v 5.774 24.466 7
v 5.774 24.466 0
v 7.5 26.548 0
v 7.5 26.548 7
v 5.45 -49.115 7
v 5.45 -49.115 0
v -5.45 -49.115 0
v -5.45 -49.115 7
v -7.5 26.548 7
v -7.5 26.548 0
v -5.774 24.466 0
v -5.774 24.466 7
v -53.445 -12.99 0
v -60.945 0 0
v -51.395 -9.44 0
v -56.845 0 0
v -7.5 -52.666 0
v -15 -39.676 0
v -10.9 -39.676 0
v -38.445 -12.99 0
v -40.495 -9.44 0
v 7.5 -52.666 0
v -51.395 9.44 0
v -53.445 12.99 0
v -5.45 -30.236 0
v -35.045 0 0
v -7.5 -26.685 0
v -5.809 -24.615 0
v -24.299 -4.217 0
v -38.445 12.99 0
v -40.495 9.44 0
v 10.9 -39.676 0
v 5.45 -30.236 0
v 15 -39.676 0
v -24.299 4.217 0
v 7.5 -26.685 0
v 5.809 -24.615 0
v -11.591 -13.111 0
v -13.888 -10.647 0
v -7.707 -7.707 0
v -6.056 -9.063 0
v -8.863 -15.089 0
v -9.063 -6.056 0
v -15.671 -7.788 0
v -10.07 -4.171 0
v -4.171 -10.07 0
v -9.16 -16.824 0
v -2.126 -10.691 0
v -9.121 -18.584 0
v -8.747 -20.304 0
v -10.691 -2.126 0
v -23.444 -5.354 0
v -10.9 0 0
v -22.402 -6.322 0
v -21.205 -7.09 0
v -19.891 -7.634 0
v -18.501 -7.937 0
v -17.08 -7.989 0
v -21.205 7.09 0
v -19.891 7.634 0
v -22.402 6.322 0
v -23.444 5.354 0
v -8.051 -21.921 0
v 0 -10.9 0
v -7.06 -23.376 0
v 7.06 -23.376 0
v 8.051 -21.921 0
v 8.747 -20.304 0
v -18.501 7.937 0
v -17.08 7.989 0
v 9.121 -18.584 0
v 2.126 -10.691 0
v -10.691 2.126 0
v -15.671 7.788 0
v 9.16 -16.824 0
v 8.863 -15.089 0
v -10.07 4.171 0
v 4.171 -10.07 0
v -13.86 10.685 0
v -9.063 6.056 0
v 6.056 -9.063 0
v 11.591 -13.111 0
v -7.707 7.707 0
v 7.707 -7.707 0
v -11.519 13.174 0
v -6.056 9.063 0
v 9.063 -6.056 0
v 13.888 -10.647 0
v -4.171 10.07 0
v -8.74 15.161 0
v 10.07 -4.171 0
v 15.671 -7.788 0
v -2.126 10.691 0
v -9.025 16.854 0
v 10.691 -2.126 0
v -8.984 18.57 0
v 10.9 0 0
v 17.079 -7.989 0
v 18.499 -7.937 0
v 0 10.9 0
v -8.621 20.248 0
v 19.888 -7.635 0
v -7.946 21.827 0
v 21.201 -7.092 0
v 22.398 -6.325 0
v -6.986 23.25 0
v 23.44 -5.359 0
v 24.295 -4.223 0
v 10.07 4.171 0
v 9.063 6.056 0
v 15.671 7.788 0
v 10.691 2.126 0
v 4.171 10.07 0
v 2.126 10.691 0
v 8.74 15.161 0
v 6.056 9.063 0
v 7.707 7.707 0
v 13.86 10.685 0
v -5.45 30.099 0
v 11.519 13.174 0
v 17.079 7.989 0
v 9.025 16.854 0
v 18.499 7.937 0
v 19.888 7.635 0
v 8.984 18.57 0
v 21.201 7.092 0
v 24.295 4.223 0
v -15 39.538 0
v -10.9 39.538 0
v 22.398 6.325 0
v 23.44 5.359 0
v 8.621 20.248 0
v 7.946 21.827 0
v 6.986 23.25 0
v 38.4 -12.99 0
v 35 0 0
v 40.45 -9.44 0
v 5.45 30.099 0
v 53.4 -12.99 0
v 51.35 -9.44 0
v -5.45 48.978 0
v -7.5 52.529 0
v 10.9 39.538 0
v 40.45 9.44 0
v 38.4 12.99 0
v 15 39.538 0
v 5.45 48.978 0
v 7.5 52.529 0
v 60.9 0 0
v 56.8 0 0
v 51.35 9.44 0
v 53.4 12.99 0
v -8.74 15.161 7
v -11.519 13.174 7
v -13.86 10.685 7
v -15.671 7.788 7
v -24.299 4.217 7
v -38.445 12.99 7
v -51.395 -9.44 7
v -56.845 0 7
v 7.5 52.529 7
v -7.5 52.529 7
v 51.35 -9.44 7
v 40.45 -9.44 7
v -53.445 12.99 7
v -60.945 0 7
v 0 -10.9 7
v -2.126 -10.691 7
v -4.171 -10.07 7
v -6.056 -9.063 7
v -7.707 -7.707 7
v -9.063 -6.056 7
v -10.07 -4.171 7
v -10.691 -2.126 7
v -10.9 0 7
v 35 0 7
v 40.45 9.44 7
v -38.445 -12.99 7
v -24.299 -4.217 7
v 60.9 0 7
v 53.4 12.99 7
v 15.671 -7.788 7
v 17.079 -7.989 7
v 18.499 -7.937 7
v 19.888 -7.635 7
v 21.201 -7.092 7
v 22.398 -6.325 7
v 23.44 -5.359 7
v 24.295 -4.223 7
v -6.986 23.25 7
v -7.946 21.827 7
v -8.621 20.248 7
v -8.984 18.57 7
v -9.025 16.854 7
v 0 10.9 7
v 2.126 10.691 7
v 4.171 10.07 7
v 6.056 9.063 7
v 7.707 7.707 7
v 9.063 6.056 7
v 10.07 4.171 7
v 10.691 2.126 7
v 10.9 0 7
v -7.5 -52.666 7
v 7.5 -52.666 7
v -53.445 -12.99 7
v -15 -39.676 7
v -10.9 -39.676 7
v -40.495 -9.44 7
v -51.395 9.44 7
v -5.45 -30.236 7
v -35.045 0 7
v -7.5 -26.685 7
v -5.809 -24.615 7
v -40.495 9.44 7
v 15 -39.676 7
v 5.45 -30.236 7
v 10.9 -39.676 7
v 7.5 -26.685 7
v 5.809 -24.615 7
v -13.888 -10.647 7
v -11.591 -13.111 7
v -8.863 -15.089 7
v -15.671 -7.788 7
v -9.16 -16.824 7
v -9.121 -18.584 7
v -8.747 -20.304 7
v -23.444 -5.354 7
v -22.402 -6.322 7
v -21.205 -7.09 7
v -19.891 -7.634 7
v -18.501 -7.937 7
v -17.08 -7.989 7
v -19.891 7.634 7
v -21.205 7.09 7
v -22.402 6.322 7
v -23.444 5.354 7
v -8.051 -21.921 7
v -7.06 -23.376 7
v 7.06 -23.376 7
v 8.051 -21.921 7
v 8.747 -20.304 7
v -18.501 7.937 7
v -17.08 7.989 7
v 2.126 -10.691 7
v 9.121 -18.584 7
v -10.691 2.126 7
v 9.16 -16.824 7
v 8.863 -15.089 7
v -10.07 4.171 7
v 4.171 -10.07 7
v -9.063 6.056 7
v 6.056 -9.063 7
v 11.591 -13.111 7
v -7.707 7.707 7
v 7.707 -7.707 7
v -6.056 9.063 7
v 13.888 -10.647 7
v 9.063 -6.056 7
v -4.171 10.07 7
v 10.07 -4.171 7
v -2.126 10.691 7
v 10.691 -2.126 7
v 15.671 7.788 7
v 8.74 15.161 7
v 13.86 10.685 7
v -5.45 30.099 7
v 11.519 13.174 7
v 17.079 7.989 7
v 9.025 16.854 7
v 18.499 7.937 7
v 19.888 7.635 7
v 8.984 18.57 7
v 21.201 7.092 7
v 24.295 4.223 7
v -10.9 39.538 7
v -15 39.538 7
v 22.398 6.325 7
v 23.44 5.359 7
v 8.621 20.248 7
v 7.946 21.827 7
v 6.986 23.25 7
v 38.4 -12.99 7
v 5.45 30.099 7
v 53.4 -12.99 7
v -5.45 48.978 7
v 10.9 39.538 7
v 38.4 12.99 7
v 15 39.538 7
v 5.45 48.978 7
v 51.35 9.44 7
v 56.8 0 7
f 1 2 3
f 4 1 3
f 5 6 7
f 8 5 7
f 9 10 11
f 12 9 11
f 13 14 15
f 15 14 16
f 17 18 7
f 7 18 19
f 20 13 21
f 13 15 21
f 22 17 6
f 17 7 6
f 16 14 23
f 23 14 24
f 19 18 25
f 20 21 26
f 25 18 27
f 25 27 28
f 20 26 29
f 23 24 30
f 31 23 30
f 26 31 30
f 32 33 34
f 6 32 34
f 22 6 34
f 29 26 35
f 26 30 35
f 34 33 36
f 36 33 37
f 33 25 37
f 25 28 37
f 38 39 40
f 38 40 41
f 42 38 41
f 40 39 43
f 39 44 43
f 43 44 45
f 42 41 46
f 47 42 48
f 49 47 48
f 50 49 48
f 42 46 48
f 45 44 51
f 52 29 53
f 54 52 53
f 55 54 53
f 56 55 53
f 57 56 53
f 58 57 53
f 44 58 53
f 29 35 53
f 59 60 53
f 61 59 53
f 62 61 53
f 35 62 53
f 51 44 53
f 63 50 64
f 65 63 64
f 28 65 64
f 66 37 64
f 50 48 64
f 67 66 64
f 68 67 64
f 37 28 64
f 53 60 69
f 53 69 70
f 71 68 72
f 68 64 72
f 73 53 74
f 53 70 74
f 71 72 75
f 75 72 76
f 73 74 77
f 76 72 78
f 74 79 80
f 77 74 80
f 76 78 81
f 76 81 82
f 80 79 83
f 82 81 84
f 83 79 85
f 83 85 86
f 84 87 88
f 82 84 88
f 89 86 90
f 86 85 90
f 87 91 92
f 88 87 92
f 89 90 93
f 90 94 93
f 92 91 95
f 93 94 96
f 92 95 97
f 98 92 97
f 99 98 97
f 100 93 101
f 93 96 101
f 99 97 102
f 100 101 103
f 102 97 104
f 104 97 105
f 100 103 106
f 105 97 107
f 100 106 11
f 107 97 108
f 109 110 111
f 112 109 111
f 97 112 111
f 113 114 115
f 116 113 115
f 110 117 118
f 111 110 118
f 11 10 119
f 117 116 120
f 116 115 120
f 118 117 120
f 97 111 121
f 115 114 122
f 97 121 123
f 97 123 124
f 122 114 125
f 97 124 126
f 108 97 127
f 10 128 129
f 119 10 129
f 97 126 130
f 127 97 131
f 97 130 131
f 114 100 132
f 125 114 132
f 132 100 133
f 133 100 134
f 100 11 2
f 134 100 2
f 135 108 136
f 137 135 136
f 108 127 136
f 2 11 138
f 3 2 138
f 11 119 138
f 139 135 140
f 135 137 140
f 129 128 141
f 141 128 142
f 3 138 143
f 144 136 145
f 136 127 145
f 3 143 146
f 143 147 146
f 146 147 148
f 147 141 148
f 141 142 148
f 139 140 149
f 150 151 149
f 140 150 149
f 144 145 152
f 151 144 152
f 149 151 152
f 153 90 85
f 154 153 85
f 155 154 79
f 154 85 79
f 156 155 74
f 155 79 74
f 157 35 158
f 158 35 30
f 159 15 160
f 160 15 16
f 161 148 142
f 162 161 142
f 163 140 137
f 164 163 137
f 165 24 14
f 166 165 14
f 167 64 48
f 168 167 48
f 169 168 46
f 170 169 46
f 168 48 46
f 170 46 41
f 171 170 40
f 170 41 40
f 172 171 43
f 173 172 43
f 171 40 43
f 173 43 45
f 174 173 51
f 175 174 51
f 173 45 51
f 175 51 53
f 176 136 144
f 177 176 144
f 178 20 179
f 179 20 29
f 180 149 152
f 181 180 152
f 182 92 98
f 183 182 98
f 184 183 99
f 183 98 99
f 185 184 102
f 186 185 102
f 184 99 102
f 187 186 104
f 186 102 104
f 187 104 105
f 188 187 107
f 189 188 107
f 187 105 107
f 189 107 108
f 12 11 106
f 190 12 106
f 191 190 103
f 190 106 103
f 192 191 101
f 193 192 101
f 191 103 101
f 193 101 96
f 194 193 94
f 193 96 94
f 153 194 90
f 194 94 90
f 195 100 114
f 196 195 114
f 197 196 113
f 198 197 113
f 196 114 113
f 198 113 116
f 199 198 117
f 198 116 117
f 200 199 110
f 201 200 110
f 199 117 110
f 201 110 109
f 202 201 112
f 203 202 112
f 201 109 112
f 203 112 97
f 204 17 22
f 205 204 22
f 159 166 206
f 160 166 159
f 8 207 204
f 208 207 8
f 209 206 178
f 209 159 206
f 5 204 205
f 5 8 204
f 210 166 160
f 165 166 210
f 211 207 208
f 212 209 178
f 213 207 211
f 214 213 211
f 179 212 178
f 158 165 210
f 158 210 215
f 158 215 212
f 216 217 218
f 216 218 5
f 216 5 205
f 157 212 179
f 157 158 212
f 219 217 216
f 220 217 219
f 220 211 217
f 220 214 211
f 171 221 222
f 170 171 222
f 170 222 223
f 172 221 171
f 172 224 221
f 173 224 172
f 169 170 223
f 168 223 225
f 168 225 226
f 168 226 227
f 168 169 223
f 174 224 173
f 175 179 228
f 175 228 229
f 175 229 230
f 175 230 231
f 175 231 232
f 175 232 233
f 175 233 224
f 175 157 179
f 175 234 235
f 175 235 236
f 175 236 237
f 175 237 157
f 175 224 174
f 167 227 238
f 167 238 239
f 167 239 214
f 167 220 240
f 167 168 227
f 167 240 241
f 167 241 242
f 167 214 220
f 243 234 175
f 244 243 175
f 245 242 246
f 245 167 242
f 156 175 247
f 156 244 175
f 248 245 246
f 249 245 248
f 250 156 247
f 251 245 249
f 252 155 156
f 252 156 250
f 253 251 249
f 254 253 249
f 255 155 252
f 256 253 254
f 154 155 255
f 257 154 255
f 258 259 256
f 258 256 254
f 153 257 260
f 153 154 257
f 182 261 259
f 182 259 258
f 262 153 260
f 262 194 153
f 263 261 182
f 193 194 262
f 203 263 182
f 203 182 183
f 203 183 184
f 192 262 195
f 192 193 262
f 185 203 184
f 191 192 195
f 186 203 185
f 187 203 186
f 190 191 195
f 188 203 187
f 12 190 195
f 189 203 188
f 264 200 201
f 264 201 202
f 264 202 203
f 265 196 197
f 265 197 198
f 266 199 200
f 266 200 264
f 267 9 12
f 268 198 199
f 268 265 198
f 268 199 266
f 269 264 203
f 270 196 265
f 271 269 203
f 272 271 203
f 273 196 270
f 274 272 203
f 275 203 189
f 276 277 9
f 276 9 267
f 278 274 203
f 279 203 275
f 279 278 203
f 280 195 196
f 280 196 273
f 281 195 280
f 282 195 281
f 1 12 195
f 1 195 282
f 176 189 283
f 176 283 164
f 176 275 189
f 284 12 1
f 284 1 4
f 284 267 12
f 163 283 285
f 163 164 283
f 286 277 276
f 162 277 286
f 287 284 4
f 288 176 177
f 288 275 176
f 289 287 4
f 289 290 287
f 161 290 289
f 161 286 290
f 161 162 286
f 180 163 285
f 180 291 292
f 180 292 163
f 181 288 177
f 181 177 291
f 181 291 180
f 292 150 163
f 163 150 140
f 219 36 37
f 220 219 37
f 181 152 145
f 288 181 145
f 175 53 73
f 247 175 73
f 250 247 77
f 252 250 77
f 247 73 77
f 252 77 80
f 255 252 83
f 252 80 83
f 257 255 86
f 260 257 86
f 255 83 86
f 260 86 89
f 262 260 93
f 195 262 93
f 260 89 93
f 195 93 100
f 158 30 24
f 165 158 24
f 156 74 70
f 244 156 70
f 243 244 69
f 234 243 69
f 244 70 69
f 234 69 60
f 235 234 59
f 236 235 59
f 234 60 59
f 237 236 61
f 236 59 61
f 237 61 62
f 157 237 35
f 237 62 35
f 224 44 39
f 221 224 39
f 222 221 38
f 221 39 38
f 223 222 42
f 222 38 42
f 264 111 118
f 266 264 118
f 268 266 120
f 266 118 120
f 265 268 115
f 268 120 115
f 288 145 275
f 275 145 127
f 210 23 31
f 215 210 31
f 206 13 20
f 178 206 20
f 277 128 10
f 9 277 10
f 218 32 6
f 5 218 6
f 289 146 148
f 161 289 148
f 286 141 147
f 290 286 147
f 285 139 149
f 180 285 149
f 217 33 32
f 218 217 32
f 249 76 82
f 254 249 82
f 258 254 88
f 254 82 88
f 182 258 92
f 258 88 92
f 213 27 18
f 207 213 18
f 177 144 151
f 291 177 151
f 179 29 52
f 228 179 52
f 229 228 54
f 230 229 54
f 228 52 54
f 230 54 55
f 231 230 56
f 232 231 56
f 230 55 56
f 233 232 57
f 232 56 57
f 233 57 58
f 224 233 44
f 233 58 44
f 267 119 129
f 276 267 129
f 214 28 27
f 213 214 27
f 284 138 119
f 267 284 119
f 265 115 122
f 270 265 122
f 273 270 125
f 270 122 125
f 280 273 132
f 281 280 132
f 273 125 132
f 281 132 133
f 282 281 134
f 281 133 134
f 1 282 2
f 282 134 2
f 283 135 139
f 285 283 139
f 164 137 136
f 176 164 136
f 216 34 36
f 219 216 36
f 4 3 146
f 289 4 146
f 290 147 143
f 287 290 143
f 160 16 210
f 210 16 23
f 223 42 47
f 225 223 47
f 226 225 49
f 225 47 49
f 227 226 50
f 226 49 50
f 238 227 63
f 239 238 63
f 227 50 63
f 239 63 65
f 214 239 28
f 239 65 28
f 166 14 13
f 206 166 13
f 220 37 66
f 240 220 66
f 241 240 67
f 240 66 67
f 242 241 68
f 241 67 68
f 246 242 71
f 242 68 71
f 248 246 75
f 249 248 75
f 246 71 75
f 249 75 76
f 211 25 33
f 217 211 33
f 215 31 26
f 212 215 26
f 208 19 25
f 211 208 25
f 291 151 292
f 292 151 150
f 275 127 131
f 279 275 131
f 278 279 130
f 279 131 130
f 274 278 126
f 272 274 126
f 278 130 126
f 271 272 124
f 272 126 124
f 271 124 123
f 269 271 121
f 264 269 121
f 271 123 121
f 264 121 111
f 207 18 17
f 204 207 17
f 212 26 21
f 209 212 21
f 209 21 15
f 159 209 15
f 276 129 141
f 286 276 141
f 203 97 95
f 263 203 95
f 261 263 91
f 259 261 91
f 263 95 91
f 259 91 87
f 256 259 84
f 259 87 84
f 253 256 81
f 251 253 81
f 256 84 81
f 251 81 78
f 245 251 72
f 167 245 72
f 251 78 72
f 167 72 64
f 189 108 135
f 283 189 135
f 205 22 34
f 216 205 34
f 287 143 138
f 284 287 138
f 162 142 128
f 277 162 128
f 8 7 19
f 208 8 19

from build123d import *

# Parameters (mm, degrees)
F1_DEPTH = 7


# Not quite as in the source:
# - a feature names something its author has since deleted; it is built from what else it names


with BuildPart() as f1:
    # F0 (on Top) → F1 (new body)
    with BuildSketch(Plane.XY):
        Polygon((-53.4446571767, -12.9903810568), (-38.4446571767, -12.9903810568), (-30.9446571767, 0), (-38.4446571767, 12.9903810568), (-53.4446571767, 12.9903810568), (-60.9446571767, 0), align=None)
        Polygon((-56.8446571767, 0), (-51.3946571767, 9.4396769013), (-40.4946571767, 9.4396769013), (-35.0446571767, 0), (-40.4946571767, -9.4396769013), (-51.3946571767, -9.4396769013), align=None, mode=Mode.SUBTRACT)
        with BuildLine():
            ThreePointArc((0, 10.9), (7.7074639149, 7.7074639149), (10.9, 0))
            Line((10.9, 0), (17.5, 0))
            ThreePointArc((17.5, 0), (17.0367250374, 4), (15.6714285714, 7.78821716))
            ThreePointArc((15.6714285714, 7.78821716), (12.7504247795, 11.9865202599), (8.7403572641, 15.1610077137))
            ThreePointArc((8.7403572641, 15.1610077137), (4.5239565101, 16.9051417473), (0, 17.5))
            Line((0, 17.5), (0, 10.9))
        make_face()
        with BuildLine():
            Line((17.5, 0), (10.9, 0))
            ThreePointArc((10.9, 0), (7.7074639149, -7.7074639149), (0, -10.9))
            Line((0, -10.9), (0, -17.5))
            ThreePointArc((0, -17.5), (4.5925968465, -16.8866235289), (8.8632518819, -15.0894919092))
            ThreePointArc((8.8632518819, -15.0894919092), (12.7990151761, -11.9346223452), (15.6714285714, -7.78821716))
            ThreePointArc((15.6714285714, -7.78821716), (17.0367250374, -4), (17.5, 0))
        make_face()
        with BuildLine():
            ThreePointArc((-10.9, 0), (-7.7074639149, 7.7074639149), (0, 10.9))
            Line((0, 10.9), (0, 17.5))
            ThreePointArc((0, 17.5), (-4.5239565101, 16.9051417473), (-8.7403572641, 15.1610077137))
            ThreePointArc((-8.7403572641, 15.1610077137), (-12.7504247795, 11.9865202599), (-15.6714285714, 7.78821716))
            ThreePointArc((-15.6714285714, 7.78821716), (-17.0367250374, 4), (-17.5, 0))
            Line((-17.5, 0), (-10.9, 0))
        make_face()
        Polygon((-7.5, 26.5479130202), (0, 26.5479130202), (7.5, 26.5479130202), (15, 39.5382940769), (7.5, 52.5286751337), (-7.5, 52.5286751337), (-15, 39.5382940769), align=None)
        Polygon((-10.9, 39.5382940769), (-5.45, 48.9779709782), (5.45, 48.9779709782), (10.9, 39.5382940769), (5.45, 30.0986171757), (-5.45, 30.0986171757), align=None, mode=Mode.SUBTRACT)
        Polygon((30.9, 0), (38.4, -12.9903810568), (53.4, -12.9903810568), (60.9, 0), (53.4, 12.9903810568), (38.4, 12.9903810568), align=None)
        Polygon((40.45, -9.4396769013), (35, 0), (40.45, 9.4396769013), (51.35, 9.4396769013), (56.8, 0), (51.35, -9.4396769013), align=None, mode=Mode.SUBTRACT)
        Polygon((7.5, -26.6851936929), (0, -26.6851936929), (-7.5, -26.6851936929), (-15, -39.6755747497), (-7.5, -52.6659558065), (7.5, -52.6659558065), (15, -39.6755747497), align=None)
        Polygon((-10.9, -39.6755747497), (-5.45, -30.2358978485), (5.45, -30.2358978485), (10.9, -39.6755747497), (5.45, -49.115251651), (-5.45, -49.115251651), align=None, mode=Mode.SUBTRACT)
        with BuildLine():
            Line((0, 26.5479130202), (0, 17.5))
            Line((0, 17.5), (5.7741715282, 24.4658935667))
            ThreePointArc((5.7741715282, 24.4658935667), (3.0690333104, 26.0115077724), (0, 26.5479130202))
        make_face()
        with BuildLine():
            Line((7.5, 26.5479130202), (0, 26.5479130202))
            ThreePointArc((0, 26.5479130202), (3.0690333104, 26.0115077724), (5.7741715282, 24.4658935667))
            Line((5.7741715282, 24.4658935667), (7.5, 26.5479130202))
        make_face()
        with BuildLine():
            ThreePointArc((-5.7741715282, 24.4658935667), (-3.0690333104, 26.0115077724), (0, 26.5479130202))
            Line((0, 26.5479130202), (-7.5, 26.5479130202))
            Line((-7.5, 26.5479130202), (-5.7741715282, 24.4658935667))
        make_face()
        with BuildLine():
            Line((-5.7741715282, 24.4658935667), (0, 17.5))
            Line((0, 17.5), (0, 26.5479130202))
            ThreePointArc((0, 26.5479130202), (-3.0690333104, 26.0115077724), (-5.7741715282, 24.4658935667))
        make_face()
        with BuildLine():
            Line((5.8093756333, -24.6146987236), (0, -17.5))
            Line((0, -17.5), (0, -26.6851936929))
            ThreePointArc((0, -26.6851936929), (3.0836583252, -26.1521000058), (5.8093756333, -24.6146987236))
        make_face()
        with BuildLine():
            ThreePointArc((5.8093756333, -24.6146987236), (3.0836583252, -26.1521000058), (0, -26.6851936929))
            Line((0, -26.6851936929), (7.5, -26.6851936929))
            Line((7.5, -26.6851936929), (5.8093756333, -24.6146987236))
        make_face()
        with BuildLine():
            Line((-7.5, -26.6851936929), (0, -26.6851936929))
            ThreePointArc((0, -26.6851936929), (-3.0836583252, -26.1521000058), (-5.8093756333, -24.6146987236))
            Line((-5.8093756333, -24.6146987236), (-7.5, -26.6851936929))
        make_face()
        with BuildLine():
            Line((0, -26.6851936929), (0, -17.5))
            Line((0, -17.5), (-5.8093756333, -24.6146987236))
            ThreePointArc((-5.8093756333, -24.6146987236), (-3.0836583252, -26.1521000058), (0, -26.6851936929))
        make_face()
        with BuildLine():
            Line((-38.4446571767, -12.9903810568), (-24.2985391386, -4.2166177892))
            ThreePointArc((-24.2985391386, -4.2166177892), (-25.1937738825, -2.1922234023), (-25.5, 0))
            Line((-25.5, 0), (-30.9446571767, 0))
            Line((-30.9446571767, 0), (-38.4446571767, -12.9903810568))
        make_face()
        with BuildLine():
            ThreePointArc((-25.5, 0), (-25.1937738825, 2.1922234023), (-24.2985391386, 4.2166177892))
            Line((-24.2985391386, 4.2166177892), (-38.4446571767, 12.9903810568))
            Line((-38.4446571767, 12.9903810568), (-30.9446571767, 0))
            Line((-30.9446571767, 0), (-25.5, 0))
        make_face()
        with BuildLine():
            ThreePointArc((25.5, 0), (25.1927245669, -2.1959027158), (24.2945028156, -4.2231186922))
            Line((24.2945028156, -4.2231186922), (38.4, -12.9903810568))
            Line((38.4, -12.9903810568), (30.9, 0))
            Line((30.9, 0), (25.5, 0))
        make_face()
        with BuildLine():
            Line((38.4, 12.9903810568), (24.2945028156, 4.2231186922))
            ThreePointArc((24.2945028156, 4.2231186922), (25.1927245669, 2.1959027158), (25.5, 0))
            Line((25.5, 0), (30.9, 0))
            Line((30.9, 0), (38.4, 12.9903810568))
        make_face()
        with BuildLine():
            Line((-24.2985391386, -4.2166177892), (-17.5, 0))
            Line((-17.5, 0), (-22.5, 0))
            Line((-22.5, 0), (-25.5, 0))
            ThreePointArc((-25.5, 0), (-25.1937738825, -2.1922234023), (-24.2985391386, -4.2166177892))
        make_face()
        with BuildLine():
            Line((-22.5, 0), (-17.5, 0))
            Line((-17.5, 0), (-24.2985391386, 4.2166177892))
            ThreePointArc((-24.2985391386, 4.2166177892), (-25.1937738825, 2.1922234023), (-25.5, 0))
            Line((-25.5, 0), (-22.5, 0))
        make_face()
        with BuildLine():
            Line((24.2945028156, 4.2231186922), (17.5, 0))
            Line((17.5, 0), (22.5, 0))
            Line((22.5, 0), (25.5, 0))
            ThreePointArc((25.5, 0), (25.1927245669, 2.1959027158), (24.2945028156, 4.2231186922))
        make_face()
        with BuildLine():
            Line((22.5, 0), (17.5, 0))
            Line((17.5, 0), (24.2945028156, -4.2231186922))
            ThreePointArc((24.2945028156, -4.2231186922), (25.1927245669, -2.1959027158), (25.5, 0))
            Line((25.5, 0), (22.5, 0))
        make_face()
        with BuildLine():
            Line((-5.8093756333, -24.6146987236), (0, -17.5))
            ThreePointArc((0, -17.5), (-4.5925968465, -16.8866235289), (-8.8632518819, -15.0894919092))
            ThreePointArc((-8.8632518819, -15.0894919092), (-8.7466502596, -20.3042632567), (-5.8093756333, -24.6146987236))
        make_face()
        with BuildLine():
            ThreePointArc((8.8632518819, -15.0894919092), (4.5925968465, -16.8866235289), (0, -17.5))
            Line((0, -17.5), (5.8093756333, -24.6146987236))
            ThreePointArc((5.8093756333, -24.6146987236), (8.7466502596, -20.3042632567), (8.8632518819, -15.0894919092))
        make_face()
        with BuildLine():
            Line((24.2945028156, -4.2231186922), (17.5, 0))
            ThreePointArc((17.5, 0), (17.0367250374, -4), (15.6714285714, -7.78821716))
            ThreePointArc((15.6714285714, -7.78821716), (20.5565667679, -7.3930642898), (24.2945028156, -4.2231186922))
        make_face()
        with BuildLine():
            ThreePointArc((15.6714285714, 7.78821716), (17.0367250374, 4), (17.5, 0))
            Line((17.5, 0), (24.2945028156, 4.2231186922))
            ThreePointArc((24.2945028156, 4.2231186922), (20.5565667679, 7.3930642898), (15.6714285714, 7.78821716))
        make_face()
        with BuildLine():
            ThreePointArc((-15.6714285714, -7.78821716), (-17.0367250374, -4), (-17.5, 0))
            Line((-17.5, 0), (-24.2985391386, -4.2166177892))
            ThreePointArc((-24.2985391386, -4.2166177892), (-20.5601021676, -7.3916016346), (-15.6714285714, -7.78821716))
        make_face()
        with BuildLine():
            Line((0, -17.5), (0, -10.9))
            ThreePointArc((0, -10.9), (-7.7074639149, -7.7074639149), (-10.9, 0))
            Line((-10.9, 0), (-17.5, 0))
            ThreePointArc((-17.5, 0), (-17.0367250374, -4), (-15.6714285714, -7.78821716))
            ThreePointArc((-15.6714285714, -7.78821716), (-12.7990151761, -11.9346223452), (-8.8632518819, -15.0894919092))
            ThreePointArc((-8.8632518819, -15.0894919092), (-4.5925968465, -16.8866235289), (0, -17.5))
        make_face()
        with BuildLine():
            Line((-24.2985391386, 4.2166177892), (-17.5, 0))
            ThreePointArc((-17.5, 0), (-17.0367250374, 4), (-15.6714285714, 7.78821716))
            ThreePointArc((-15.6714285714, 7.78821716), (-20.5601021676, 7.3916016346), (-24.2985391386, 4.2166177892))
        make_face()
        with BuildLine():
            ThreePointArc((-8.7403572641, 15.1610077137), (-4.5239565101, 16.9051417473), (0, 17.5))
            Line((0, 17.5), (-5.7741715282, 24.4658935667))
            ThreePointArc((-5.7741715282, 24.4658935667), (-8.6205053042, 20.2480208005), (-8.7403572641, 15.1610077137))
        make_face()
        with BuildLine():
            Line((5.7741715282, 24.4658935667), (0, 17.5))
            ThreePointArc((0, 17.5), (4.5239565101, 16.9051417473), (8.7403572641, 15.1610077137))
            ThreePointArc((8.7403572641, 15.1610077137), (8.6205053042, 20.2480208005), (5.7741715282, 24.4658935667))
        make_face()
    extrude(amount=F1_DEPTH)


solid = f1.part
